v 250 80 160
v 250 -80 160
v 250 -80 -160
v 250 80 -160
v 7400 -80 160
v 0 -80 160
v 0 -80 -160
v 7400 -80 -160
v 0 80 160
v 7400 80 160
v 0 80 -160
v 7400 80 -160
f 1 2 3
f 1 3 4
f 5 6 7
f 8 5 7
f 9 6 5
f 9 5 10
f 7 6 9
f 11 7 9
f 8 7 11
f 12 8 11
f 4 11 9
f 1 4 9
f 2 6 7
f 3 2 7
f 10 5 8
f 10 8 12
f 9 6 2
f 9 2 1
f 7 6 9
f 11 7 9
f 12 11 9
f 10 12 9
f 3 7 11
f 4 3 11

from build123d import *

# Parameters (mm, degrees)
F0_W     = 160
F0_H     = 160
F1_DEPTH = 7400
F2_DEPTH = 250


with BuildPart() as f1:
    # F0 (on Right) → F1 (new body)
    with BuildSketch(Plane.YZ):
        with Locations((0, 80)):
            Rectangle(F0_W, F0_H)
        with Locations((0, -80)):
            Rectangle(F0_W, F0_H)
    extrude(amount=F1_DEPTH)


with BuildPart() as f2:
    # F0 (on Right) → F2 (new body)
    with BuildSketch(Plane.YZ):
        with Locations((0, 80)):
            Rectangle(F0_W, F0_H)
        with Locations((0, -80)):
            Rectangle(F0_W, F0_H)
    extrude(amount=F2_DEPTH)


solid = Compound([f1.part, f2.part])
